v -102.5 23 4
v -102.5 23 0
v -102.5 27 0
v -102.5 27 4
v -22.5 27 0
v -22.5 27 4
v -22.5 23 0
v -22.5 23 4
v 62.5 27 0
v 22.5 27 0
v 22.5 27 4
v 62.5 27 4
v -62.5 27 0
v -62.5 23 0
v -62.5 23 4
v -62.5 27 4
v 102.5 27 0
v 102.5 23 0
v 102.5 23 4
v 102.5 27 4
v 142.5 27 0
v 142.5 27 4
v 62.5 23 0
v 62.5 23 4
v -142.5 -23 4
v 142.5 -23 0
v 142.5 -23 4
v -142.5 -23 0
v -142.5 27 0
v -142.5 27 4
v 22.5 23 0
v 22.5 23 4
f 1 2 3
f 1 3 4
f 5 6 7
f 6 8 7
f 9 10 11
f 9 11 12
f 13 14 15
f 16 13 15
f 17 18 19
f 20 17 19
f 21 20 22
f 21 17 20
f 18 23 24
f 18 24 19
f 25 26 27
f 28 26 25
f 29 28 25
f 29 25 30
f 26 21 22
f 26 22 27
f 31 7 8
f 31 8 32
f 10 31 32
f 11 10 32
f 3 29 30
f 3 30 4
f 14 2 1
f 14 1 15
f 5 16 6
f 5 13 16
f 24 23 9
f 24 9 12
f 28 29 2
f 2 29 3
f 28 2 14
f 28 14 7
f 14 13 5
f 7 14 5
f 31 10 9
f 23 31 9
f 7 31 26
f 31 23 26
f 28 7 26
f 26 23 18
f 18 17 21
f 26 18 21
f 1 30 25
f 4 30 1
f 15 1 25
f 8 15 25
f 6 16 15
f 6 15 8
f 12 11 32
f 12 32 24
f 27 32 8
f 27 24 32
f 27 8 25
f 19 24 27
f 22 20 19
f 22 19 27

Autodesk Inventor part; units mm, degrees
ref_plane "YZ Plane" through (0, 0, 0) normal (1, 0, 0) x (0, 1, 0)
ref_plane "XZ Plane" through (0, 0, 0) normal (0, 1, 0) x (-1, 0, 0)
ref_plane "XY Plane" through (0, 0, 0) normal (0, 0, 1) x (1, 0, 0)
sketch "Эскиз1" plane through (0, 0, 0) normal (0, 0, 1) x (1, 0, 0)
  line L0 (-142.5, 23) -> (142.5, 23)
  line L1 (142.5, 23) -> (142.5, -23)
  line L2 (142.5, -23) -> (-142.5, -23)
  line L3 (-142.5, -23) -> (-142.5, 23)
  line L4 (-142.5, 23) -> (142.5, -23) construction
  line L5 (142.5, 23) -> (-142.5, -23) construction
  point P0 (0, 0)
  dimension "d0" = 285
  dimension "d1" = 46
extrude "Выдавливание1" add sketch "Эскиз1" along normal blind 4
sketch "Эскиз2" plane through (-142.5, 23, 0) normal (0, 1, 0) x (1, 0, 0)
  line L0 (285, 0) -> (0, 0) projected
  line L1 (0, 0) -> (0, -4) projected
  line L2 (285, -4) -> (0, -4) projected
  line L3 (285, 0) -> (285, -4) projected
  line L4 (40, 0) -> (40, -4)
  line L5 (0, 0) -> (285, 0) projected
  line L6 (80, 0) -> (80, -4)
  line L7 (165, 0) -> (165, -4)
  line L8 (0, -4) -> (285, -4) projected
  line L9 (205, 0) -> (205, -4)
  line L10 (245, 0) -> (245, -4)
  line L11 (120, -4) -> (120, 0)
  point P0 (142.5, 0)
  point P1 (0, -2)
  point P2 (40, -2)
  point P3 (285, -2)
  point P4 (165, -2)
  point P5 (205, -2)
  point P6 (245, -2)
  point P7 (80, -2)
  point P8 (120, -2)
  dimension "d4" = 40
  dimension "d5" = 40
  dimension "d6" = 40
  dimension "d8" = 40
  dimension "d9" = 40
  dimension "d10" = 40
extrude "Выдавливание2" add sketch "Эскиз2" along normal blind 4 contours L3 L2 L10 L0 | L9 L2 L7 L0 | L11 L2 L6 L0 | L4 L2 L1 L0
properties part number "стенкаB"
